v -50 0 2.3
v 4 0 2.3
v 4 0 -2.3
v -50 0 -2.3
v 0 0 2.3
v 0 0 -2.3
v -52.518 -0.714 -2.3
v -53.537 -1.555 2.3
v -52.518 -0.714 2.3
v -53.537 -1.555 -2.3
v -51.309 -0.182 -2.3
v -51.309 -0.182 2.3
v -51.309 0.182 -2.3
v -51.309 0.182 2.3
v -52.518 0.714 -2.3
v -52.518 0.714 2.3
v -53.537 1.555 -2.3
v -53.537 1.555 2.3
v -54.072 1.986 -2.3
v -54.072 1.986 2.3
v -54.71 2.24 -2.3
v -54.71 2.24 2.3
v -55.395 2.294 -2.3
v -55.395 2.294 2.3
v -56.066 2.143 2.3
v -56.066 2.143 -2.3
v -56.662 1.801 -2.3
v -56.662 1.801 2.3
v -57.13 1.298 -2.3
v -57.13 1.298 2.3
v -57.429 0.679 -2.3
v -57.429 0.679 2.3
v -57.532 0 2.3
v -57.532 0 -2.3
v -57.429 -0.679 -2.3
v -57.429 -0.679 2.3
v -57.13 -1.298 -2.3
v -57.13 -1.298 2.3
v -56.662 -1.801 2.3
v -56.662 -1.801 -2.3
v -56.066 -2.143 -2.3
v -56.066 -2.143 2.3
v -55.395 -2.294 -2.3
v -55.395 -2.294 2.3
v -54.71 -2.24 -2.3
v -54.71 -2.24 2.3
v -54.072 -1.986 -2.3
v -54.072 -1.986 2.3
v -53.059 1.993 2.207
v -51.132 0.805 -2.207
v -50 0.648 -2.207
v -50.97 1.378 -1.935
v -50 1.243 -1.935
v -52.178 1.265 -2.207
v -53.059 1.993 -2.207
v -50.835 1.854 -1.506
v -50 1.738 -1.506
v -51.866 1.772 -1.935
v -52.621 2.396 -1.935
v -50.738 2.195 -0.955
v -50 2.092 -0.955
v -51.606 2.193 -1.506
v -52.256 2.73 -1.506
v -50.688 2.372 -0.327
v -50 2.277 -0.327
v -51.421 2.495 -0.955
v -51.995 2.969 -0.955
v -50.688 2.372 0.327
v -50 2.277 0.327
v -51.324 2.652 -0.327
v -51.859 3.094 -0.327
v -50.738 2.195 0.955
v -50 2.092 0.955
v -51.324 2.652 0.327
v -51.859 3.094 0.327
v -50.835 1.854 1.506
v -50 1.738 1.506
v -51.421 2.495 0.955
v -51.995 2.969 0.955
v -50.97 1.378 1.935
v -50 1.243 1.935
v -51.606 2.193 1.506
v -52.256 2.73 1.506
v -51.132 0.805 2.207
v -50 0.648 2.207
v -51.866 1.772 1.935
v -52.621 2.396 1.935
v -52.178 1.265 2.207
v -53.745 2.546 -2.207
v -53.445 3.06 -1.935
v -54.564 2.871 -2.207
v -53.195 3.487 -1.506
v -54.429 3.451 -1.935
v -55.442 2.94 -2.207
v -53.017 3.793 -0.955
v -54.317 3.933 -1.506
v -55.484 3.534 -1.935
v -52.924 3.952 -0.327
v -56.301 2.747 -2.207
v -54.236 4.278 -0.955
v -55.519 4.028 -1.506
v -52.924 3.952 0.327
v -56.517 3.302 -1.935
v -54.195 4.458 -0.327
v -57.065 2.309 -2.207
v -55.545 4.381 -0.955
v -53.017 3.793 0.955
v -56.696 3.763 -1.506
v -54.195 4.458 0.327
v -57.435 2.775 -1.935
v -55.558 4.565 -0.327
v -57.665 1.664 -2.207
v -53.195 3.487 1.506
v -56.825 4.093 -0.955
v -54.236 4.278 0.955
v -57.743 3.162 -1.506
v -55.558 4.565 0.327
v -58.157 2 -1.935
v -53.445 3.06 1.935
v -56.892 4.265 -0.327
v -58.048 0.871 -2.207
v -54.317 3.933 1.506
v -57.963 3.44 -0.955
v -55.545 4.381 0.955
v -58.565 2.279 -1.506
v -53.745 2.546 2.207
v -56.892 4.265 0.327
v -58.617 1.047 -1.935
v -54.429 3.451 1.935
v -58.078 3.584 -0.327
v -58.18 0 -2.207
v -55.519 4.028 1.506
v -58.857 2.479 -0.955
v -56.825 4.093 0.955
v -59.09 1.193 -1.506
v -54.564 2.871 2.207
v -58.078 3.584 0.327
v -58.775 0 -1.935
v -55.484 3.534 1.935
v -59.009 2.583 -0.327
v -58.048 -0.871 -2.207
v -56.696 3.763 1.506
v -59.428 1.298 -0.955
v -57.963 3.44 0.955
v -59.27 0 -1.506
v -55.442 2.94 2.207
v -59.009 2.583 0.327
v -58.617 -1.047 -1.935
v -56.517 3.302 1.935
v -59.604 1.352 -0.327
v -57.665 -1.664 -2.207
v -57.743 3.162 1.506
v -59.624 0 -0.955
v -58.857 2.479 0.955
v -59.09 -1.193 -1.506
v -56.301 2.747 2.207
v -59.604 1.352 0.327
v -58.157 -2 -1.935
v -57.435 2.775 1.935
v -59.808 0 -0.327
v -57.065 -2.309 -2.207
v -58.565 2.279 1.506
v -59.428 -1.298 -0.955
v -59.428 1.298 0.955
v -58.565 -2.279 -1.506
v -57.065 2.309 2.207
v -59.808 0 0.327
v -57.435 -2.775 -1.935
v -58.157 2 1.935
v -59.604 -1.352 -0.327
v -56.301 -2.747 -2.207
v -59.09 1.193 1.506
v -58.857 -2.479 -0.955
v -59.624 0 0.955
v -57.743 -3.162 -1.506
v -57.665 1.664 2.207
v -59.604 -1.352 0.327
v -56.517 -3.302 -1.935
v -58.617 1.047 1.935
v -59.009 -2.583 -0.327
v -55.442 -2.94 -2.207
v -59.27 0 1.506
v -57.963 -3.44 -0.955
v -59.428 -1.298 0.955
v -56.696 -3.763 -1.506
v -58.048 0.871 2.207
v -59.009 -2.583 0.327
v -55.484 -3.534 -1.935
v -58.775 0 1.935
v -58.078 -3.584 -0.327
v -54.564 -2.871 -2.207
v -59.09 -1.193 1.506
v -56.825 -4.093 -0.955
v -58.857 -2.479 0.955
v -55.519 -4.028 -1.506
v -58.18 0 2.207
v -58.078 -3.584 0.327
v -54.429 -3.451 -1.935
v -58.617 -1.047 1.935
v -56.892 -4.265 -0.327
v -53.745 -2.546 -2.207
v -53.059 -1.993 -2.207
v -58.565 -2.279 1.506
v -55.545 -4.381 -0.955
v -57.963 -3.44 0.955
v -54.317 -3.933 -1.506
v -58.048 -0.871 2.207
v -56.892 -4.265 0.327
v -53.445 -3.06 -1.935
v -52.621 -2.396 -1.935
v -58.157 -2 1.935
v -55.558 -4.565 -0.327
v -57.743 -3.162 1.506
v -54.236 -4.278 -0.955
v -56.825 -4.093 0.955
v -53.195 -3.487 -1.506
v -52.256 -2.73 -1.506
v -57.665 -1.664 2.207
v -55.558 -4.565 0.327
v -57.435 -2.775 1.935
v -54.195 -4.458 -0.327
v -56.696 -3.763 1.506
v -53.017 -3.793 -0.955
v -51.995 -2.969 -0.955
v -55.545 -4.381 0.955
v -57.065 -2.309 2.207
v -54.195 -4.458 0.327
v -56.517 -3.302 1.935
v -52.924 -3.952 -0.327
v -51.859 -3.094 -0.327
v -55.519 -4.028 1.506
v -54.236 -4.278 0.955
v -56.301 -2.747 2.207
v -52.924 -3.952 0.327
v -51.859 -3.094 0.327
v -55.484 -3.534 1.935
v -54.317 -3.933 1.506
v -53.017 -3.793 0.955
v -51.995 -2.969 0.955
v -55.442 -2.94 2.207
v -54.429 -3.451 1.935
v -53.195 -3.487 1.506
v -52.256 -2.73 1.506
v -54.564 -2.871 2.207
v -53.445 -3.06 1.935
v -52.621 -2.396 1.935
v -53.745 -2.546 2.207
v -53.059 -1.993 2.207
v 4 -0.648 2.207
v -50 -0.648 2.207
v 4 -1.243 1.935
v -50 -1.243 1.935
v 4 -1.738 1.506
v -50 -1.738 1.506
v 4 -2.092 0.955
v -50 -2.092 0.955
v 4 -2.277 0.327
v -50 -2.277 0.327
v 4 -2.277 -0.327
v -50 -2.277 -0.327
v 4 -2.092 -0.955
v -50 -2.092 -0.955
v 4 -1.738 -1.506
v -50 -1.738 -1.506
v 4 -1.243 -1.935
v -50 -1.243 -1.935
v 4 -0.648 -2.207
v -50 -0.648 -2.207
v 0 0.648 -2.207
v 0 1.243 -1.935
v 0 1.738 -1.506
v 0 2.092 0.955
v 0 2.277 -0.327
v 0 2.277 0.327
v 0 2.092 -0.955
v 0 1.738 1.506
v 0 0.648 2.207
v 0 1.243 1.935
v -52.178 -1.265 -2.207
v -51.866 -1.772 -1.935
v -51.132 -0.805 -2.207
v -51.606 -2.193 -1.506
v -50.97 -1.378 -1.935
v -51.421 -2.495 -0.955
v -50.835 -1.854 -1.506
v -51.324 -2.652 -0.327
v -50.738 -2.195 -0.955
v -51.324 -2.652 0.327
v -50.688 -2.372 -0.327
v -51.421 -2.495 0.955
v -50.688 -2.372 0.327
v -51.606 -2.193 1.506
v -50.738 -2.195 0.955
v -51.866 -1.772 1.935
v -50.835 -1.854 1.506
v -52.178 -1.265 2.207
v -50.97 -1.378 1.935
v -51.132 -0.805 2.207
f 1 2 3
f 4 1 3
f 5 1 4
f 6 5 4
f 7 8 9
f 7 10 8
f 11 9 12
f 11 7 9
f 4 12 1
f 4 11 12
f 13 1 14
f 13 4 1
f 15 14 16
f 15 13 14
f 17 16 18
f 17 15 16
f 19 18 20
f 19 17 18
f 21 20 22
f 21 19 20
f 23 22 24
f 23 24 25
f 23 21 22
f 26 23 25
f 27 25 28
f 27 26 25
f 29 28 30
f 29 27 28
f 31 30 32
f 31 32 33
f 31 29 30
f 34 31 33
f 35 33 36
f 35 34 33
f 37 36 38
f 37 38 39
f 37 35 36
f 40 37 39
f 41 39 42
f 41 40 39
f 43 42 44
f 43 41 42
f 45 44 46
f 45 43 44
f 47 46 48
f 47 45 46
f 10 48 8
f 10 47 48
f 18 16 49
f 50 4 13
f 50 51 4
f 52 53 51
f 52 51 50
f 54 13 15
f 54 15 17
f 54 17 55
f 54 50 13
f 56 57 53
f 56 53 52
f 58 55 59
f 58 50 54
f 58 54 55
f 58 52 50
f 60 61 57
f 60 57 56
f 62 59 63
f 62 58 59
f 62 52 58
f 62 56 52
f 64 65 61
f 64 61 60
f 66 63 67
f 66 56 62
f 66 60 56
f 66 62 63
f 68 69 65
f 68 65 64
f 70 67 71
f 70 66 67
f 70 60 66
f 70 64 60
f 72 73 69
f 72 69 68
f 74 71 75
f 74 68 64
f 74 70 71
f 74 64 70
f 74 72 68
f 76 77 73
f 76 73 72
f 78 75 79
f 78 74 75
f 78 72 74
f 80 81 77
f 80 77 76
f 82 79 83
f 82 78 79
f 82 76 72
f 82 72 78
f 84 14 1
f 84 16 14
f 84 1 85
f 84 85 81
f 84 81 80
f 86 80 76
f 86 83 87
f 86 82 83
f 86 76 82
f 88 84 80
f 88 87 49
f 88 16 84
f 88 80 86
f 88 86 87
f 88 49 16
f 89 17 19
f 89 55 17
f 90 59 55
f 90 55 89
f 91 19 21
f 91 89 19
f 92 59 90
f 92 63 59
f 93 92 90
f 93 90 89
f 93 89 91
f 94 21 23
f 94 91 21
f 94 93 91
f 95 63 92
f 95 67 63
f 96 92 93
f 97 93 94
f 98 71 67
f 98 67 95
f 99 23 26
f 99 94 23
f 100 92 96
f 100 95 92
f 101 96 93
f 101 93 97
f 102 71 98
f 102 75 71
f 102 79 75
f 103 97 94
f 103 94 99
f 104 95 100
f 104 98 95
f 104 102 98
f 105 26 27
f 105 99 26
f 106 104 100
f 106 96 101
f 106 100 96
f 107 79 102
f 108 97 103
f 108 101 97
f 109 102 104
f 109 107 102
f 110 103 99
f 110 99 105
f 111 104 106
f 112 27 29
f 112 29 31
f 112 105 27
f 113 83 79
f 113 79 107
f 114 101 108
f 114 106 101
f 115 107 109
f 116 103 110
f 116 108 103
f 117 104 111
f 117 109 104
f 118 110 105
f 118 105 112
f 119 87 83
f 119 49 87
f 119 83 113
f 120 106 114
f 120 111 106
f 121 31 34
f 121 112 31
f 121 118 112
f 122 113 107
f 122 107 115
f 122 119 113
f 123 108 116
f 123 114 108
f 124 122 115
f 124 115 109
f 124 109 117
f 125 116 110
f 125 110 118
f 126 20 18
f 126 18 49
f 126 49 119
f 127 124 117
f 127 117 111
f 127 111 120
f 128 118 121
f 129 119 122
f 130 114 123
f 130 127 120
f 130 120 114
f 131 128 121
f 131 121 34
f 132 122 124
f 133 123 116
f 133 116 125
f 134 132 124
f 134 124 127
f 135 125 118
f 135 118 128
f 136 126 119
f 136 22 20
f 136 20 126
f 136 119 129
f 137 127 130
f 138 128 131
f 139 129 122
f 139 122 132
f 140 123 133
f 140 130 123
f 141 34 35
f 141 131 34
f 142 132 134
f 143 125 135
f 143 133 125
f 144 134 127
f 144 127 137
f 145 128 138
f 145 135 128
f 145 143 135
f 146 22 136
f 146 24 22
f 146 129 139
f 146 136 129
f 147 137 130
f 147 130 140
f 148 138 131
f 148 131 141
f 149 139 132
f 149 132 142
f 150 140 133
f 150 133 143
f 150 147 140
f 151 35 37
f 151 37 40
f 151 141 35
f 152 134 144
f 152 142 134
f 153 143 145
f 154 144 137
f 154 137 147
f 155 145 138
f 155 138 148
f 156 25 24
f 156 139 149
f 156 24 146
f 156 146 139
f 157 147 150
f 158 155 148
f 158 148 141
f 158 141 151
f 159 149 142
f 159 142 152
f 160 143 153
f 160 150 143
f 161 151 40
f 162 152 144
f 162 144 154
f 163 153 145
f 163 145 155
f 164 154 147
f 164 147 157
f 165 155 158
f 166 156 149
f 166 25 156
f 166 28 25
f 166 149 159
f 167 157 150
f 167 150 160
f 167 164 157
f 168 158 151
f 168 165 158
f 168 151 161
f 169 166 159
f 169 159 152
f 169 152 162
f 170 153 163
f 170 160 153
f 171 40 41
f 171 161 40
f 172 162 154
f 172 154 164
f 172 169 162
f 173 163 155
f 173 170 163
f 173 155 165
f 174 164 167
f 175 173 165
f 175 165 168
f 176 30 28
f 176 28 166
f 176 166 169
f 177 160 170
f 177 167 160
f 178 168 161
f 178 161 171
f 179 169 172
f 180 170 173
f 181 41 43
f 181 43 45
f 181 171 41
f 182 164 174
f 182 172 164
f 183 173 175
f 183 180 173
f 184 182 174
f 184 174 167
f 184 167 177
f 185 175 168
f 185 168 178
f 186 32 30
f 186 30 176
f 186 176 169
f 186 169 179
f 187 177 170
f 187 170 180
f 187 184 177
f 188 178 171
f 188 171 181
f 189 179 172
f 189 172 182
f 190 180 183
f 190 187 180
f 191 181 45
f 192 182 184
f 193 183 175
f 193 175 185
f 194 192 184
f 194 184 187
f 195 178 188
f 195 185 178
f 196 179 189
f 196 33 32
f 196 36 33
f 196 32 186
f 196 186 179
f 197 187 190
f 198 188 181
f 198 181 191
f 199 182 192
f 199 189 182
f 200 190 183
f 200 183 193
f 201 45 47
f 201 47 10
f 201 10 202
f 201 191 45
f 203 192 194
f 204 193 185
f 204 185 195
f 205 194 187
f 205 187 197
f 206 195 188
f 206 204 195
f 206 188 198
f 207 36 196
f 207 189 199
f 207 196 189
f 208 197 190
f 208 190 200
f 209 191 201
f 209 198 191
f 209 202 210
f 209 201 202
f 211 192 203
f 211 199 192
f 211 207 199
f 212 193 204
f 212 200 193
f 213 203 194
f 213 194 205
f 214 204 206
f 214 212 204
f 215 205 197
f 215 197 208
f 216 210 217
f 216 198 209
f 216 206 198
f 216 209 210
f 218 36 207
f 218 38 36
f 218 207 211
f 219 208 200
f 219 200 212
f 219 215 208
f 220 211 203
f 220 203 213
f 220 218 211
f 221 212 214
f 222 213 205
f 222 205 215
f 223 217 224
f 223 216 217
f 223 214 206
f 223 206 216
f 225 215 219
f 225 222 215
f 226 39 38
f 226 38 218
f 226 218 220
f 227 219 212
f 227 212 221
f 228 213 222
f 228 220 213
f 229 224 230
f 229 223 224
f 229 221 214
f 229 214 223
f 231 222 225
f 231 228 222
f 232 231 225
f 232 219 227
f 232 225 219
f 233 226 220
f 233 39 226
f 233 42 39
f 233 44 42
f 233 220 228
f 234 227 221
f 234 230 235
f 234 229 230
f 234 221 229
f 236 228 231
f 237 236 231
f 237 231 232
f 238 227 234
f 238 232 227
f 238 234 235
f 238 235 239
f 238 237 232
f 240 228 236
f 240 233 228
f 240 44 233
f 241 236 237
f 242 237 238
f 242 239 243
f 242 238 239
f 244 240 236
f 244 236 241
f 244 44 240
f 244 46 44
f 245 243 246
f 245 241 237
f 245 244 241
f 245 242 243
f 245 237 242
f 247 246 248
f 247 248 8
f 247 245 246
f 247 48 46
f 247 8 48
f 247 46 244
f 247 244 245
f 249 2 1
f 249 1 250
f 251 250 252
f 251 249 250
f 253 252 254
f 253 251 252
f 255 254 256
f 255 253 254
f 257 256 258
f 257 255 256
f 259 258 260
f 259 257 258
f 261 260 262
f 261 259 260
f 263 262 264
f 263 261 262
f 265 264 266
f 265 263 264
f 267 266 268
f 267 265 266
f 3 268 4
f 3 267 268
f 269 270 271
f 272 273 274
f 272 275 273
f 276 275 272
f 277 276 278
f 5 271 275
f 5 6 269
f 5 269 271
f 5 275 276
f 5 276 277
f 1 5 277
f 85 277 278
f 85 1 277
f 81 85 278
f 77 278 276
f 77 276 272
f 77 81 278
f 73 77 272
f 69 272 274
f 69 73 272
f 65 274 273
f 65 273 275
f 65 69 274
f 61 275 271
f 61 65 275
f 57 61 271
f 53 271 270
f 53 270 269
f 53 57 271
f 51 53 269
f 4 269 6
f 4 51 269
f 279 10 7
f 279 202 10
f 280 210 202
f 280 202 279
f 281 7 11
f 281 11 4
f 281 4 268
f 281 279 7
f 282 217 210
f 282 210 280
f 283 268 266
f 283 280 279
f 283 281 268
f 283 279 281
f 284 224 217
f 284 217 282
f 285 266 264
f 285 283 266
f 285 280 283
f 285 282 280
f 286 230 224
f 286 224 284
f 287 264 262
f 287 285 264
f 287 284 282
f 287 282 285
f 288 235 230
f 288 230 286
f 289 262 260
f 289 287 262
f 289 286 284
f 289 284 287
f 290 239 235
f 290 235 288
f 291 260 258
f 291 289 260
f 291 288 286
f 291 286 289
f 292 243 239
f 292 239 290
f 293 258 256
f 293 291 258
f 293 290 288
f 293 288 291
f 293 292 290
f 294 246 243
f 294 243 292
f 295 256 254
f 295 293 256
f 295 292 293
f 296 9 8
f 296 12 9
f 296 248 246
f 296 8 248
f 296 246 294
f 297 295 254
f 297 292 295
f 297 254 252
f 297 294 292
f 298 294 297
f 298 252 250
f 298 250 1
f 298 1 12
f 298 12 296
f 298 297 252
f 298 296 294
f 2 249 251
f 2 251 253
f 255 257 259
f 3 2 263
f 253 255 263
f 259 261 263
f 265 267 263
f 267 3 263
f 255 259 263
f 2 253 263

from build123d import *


with BuildPart() as part:
    # 扫描1: sweep along a path in 草图1
    with BuildLine(Plane.XY) as sweep_1_path:
        Line((0, 2.3), (-50, 2.3))
        ThreePointArc((-50, 2.3), (-51.006143103, 2.511403038), (-51.842124839, 3.109859155))
        ThreePointArc((-51.842124839, 3.109859155), (-59.831634544, 0), (-51.842124839, -3.109859155))
        ThreePointArc((-51.842124839, -3.109859155), (-51.006143103, -2.511403038), (-50, -2.3))
        Line((-50, -2.3), (4, -2.3))
    # 草图2 → 扫描1 (sweep)
    with BuildSketch(Plane(origin=(0, 0, 0), x_dir=(0, 0, -1), z_dir=(1, 0, 0))):
        with BuildLine():
            Line((-2.3, 0), (2.3, 0))
            ThreePointArc((2.3, 0), (0, 2.3), (-2.3, 0))
        make_face()
    sweep(path=sweep_1_path.line)


solid = part.part
